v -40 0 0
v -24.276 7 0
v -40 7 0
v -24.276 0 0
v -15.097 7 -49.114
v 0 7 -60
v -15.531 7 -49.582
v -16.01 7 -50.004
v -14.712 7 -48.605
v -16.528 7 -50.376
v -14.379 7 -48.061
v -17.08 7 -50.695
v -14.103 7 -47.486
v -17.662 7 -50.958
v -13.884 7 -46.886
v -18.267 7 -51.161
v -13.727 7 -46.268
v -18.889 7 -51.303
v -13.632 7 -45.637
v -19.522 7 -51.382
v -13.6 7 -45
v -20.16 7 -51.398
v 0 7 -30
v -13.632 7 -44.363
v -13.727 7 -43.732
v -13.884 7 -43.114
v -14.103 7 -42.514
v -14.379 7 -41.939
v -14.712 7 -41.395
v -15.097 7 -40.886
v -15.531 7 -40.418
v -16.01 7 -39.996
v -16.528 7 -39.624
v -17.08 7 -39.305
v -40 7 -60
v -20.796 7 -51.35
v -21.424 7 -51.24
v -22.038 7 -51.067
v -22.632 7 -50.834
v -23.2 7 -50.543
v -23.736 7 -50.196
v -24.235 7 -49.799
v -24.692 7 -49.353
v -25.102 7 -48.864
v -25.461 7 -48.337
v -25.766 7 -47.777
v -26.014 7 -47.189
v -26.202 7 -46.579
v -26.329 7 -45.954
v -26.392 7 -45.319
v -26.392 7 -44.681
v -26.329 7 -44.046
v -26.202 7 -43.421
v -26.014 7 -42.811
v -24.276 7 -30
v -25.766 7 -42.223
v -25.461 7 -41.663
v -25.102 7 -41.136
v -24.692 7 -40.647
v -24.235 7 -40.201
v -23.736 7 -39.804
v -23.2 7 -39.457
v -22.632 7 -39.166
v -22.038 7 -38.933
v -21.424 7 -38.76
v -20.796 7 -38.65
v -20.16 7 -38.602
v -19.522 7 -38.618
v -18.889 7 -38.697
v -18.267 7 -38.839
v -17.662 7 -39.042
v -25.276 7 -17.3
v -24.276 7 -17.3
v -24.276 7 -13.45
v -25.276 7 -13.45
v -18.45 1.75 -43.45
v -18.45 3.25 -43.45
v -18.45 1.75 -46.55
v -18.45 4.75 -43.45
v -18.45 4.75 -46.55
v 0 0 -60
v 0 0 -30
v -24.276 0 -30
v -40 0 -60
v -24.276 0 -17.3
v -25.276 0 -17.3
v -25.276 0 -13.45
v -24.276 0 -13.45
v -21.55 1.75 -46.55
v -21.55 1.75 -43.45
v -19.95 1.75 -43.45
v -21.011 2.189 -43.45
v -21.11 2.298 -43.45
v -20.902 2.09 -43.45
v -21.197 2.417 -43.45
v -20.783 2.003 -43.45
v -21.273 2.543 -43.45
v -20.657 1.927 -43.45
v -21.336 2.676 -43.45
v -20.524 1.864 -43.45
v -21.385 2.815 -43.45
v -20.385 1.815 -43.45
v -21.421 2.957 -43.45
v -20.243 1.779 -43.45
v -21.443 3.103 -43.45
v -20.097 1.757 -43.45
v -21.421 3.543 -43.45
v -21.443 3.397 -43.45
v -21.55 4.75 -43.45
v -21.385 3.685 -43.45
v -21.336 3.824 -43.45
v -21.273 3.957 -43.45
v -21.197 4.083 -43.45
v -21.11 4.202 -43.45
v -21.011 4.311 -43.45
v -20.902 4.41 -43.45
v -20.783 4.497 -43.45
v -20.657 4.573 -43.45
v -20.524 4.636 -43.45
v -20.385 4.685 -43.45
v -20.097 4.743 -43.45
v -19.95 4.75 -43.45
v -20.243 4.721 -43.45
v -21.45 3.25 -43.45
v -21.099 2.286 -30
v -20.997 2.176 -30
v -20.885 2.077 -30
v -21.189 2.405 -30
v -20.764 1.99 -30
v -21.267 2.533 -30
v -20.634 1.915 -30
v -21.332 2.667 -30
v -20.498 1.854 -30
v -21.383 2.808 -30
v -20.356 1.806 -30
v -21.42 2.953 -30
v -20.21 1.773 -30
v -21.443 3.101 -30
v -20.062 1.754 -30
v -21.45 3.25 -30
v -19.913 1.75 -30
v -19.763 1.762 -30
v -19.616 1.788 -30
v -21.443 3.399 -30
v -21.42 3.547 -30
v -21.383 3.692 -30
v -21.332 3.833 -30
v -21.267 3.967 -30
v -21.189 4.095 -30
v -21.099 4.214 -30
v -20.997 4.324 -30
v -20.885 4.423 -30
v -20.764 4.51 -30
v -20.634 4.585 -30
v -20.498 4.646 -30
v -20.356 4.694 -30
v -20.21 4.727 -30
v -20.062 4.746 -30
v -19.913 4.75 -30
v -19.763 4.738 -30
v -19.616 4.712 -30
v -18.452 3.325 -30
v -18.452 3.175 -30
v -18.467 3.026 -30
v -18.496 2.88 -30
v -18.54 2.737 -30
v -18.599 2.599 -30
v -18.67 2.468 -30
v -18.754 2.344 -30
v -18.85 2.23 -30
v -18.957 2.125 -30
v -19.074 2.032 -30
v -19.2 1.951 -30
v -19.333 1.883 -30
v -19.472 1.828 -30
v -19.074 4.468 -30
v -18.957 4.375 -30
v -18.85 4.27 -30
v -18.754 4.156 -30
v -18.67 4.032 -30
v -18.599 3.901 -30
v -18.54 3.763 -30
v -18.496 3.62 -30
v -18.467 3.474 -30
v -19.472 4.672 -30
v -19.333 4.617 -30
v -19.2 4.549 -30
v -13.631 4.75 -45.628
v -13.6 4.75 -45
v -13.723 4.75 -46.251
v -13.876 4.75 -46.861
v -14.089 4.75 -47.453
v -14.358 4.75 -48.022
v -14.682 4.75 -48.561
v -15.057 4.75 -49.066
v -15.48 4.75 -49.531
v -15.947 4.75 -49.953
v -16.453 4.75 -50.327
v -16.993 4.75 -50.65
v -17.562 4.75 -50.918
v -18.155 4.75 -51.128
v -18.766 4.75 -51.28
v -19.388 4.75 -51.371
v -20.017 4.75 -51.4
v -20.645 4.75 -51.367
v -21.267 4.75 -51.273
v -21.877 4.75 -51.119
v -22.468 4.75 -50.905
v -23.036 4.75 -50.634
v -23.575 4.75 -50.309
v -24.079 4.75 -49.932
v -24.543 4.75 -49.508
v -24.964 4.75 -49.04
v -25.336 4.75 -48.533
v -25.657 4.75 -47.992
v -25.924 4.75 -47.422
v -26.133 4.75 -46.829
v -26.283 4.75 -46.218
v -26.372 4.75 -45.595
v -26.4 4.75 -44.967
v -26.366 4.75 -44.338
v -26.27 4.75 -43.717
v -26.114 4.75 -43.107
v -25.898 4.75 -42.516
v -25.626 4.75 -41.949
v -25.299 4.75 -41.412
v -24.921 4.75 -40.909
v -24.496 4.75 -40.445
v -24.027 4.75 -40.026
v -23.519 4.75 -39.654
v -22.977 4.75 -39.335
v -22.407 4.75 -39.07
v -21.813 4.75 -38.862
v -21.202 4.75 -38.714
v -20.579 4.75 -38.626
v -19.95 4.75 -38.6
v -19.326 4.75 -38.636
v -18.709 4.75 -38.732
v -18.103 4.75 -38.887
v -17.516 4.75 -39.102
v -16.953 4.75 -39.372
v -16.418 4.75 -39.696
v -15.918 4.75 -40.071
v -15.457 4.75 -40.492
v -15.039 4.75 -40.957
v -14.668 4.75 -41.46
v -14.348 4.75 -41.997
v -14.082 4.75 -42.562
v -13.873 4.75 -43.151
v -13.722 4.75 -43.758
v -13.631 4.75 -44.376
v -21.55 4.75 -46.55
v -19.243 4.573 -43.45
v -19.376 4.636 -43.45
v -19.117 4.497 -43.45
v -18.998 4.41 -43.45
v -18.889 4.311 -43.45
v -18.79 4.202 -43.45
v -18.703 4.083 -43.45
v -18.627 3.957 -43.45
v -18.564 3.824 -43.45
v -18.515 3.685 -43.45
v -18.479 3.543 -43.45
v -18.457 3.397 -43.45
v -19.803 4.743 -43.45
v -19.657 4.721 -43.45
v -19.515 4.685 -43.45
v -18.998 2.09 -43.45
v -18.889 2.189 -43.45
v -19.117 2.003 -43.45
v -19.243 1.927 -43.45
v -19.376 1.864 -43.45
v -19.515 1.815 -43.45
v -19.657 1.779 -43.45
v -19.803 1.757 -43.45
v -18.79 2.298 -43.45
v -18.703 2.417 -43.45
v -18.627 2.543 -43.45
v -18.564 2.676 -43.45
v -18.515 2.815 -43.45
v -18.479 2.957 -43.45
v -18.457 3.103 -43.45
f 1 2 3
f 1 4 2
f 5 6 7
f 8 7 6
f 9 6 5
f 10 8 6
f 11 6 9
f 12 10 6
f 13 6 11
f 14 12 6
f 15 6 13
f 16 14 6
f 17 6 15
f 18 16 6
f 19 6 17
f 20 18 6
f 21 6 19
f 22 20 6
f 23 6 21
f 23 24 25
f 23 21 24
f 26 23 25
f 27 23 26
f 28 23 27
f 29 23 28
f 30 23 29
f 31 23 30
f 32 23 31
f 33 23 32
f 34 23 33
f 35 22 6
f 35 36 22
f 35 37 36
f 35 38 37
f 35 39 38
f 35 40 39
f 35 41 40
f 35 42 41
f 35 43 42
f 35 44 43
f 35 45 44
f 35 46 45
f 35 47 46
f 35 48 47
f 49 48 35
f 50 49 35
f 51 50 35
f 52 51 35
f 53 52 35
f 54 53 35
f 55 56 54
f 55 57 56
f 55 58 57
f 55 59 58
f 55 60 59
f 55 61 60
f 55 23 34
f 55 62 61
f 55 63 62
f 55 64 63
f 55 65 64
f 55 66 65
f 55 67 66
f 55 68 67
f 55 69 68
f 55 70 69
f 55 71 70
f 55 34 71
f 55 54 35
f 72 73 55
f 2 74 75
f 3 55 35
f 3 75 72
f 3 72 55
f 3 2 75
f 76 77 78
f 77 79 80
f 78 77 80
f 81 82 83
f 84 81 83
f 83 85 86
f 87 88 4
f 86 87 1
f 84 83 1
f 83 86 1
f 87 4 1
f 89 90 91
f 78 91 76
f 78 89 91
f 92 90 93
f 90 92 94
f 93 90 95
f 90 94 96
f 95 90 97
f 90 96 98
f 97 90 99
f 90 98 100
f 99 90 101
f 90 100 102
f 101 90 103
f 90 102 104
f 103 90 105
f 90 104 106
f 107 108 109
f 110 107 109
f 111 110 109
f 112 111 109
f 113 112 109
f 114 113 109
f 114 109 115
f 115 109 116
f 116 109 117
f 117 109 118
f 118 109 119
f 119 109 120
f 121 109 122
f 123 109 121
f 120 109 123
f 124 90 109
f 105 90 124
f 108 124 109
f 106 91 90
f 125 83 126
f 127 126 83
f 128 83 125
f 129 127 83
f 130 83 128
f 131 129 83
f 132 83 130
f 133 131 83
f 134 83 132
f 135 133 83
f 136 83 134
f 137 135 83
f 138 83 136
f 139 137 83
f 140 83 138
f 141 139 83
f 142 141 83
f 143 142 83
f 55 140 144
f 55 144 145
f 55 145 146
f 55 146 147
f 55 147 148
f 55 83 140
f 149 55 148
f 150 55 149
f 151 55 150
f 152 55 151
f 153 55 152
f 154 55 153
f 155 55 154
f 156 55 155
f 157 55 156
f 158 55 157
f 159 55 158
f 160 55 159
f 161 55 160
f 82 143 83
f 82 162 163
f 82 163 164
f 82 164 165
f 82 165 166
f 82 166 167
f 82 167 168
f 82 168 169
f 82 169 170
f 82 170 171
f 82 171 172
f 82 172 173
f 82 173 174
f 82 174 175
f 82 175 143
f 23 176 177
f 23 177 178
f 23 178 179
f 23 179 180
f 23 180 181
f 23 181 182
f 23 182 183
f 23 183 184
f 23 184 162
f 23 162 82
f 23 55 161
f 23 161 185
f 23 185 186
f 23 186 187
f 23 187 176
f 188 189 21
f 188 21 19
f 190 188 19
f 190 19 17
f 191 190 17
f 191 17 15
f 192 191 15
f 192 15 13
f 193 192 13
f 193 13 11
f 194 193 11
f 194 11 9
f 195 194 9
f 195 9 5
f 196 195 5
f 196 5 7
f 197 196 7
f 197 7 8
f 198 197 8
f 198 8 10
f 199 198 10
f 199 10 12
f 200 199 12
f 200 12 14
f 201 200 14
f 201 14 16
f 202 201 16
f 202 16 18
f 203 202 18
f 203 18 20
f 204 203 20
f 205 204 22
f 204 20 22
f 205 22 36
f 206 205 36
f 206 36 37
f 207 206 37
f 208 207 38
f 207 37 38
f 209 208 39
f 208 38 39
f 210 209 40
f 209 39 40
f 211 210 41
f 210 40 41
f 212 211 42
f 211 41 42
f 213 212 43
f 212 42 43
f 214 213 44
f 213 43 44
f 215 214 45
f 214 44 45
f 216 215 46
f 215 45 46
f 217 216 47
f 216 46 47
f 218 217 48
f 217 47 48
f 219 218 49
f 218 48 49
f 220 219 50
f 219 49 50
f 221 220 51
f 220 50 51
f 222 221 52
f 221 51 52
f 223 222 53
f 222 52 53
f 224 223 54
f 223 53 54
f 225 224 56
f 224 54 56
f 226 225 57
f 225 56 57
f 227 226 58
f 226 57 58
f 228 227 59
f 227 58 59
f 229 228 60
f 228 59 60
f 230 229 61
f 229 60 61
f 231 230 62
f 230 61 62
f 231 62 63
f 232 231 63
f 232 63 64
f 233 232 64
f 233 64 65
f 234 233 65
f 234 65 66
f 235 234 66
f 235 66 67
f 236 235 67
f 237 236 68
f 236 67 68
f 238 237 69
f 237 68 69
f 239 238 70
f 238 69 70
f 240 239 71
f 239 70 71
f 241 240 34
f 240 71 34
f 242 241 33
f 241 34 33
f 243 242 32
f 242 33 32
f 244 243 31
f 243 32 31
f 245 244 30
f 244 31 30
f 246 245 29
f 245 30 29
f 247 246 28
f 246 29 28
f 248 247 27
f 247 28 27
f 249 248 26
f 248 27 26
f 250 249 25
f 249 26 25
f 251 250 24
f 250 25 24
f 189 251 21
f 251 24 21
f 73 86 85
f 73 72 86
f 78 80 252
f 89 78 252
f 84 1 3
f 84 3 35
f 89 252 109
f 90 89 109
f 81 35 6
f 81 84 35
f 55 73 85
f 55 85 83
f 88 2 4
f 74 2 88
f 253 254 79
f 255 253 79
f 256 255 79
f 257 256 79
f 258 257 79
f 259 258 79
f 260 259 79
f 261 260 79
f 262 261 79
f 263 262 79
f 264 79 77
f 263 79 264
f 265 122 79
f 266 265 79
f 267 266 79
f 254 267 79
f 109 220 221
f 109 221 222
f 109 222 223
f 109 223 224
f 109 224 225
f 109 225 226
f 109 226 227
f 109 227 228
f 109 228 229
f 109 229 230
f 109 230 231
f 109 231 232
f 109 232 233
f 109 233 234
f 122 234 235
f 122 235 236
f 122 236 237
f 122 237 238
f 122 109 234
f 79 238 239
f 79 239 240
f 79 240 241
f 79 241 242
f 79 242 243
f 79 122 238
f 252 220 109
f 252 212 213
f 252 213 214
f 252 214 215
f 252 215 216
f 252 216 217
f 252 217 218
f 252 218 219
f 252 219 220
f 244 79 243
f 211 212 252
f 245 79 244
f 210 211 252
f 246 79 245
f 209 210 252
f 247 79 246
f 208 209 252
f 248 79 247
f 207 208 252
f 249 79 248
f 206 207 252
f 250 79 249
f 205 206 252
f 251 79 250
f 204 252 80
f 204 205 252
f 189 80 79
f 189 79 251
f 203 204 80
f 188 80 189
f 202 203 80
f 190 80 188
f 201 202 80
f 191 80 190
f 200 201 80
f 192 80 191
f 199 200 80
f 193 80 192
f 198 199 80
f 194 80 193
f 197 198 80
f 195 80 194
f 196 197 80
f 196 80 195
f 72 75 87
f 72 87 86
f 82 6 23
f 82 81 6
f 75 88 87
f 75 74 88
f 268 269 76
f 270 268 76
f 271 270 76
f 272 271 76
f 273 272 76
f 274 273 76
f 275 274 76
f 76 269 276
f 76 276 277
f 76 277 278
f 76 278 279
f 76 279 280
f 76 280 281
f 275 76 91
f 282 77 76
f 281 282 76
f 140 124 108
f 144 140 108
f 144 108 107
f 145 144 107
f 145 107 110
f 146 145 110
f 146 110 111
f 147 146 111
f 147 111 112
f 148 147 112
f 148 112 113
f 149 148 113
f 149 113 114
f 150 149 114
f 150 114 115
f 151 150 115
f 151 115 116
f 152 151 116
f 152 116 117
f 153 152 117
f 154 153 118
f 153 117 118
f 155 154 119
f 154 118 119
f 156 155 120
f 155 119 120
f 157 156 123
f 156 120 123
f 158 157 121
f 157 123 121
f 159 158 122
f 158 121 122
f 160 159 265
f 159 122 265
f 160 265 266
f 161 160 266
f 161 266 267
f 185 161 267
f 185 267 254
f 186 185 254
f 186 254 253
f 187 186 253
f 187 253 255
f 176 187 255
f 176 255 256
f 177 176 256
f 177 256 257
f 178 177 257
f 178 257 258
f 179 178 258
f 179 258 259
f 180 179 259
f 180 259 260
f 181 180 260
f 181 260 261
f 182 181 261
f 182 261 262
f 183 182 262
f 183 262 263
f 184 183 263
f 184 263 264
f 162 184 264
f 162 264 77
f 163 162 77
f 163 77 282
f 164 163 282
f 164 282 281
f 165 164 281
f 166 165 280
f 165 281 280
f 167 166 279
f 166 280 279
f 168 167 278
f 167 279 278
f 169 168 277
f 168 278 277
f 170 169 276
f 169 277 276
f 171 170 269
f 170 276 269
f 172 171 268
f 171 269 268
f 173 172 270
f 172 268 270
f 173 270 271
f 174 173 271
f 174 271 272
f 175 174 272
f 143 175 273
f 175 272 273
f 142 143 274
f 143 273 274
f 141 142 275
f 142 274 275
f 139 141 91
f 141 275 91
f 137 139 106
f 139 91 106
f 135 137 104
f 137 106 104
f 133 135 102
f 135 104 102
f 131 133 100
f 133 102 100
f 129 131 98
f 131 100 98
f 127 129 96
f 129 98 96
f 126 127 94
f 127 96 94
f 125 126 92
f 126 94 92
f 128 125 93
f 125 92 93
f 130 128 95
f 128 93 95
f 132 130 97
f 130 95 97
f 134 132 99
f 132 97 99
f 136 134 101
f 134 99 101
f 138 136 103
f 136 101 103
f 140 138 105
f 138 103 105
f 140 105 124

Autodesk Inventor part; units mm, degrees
ref_plane "YZ Plane" through (0, 0, 0) normal (1, 0, 0) x (0, 1, 0)
ref_plane "XZ Plane" through (0, 0, 0) normal (0, 1, 0) x (-1, 0, 0)
ref_plane "XY Plane" through (0, 0, 0) normal (0, 0, 1) x (1, 0, 0)
sketch "Sketch1" plane through (0, 0, 0) normal (0, 1, 0) x (-1, 0, 0)
  line L0 (0, 0) -> (40, 0)
  line L1 (40, 0) -> (40, -60)
  line L2 (40, -60) -> (0, -60)
  line L3 (0, -60) -> (0, 0)
  dimension "d0" = 40
  dimension "d1" = 60
extrude "Extrusion1" add sketch "Sketch1" along normal blind 7
sketch "Sketch2" plane through (0, 7, 0) normal (0, 1, 0) x (1, 0, 0)
  line L0 (-40, 0) -> (0, 0) projected
  line L1 (0, 0) -> (-24.276, 0)
  line L2 (-24.276, 0) -> (-24.276, 30)
  line L3 (-24.276, 30) -> (0, 30)
  line L4 (0, 30) -> (0, 0)
  dimension "d4" = 24.276
  dimension "d5" = 30
extrude "Extrusion2" cut sketch "Sketch2" against normal through all
sketch "Sketch3" plane through (0, 7, 0) normal (0, 1, 0) x (1, 0, 0)
  circle A0 centre (-20, 45) radius 6.4
  point P0 (0, 0)
  dimension "d8" = 12.8
extrude "Extrusion3" cut sketch "Sketch3" against normal blind 2.25
sketch "Sketch4" plane through (-20, 4.75, -45) normal (0, 1, 0) x (1, 0, 0)
  line L0 (-1.55, -1.55) -> (1.55, -1.55)
  line L1 (1.55, -1.55) -> (1.55, 1.55)
  line L2 (1.55, 1.55) -> (-1.55, 1.55)
  line L3 (-1.55, 1.55) -> (-1.55, -1.55)
  line L4 (-1.55, -1.55) -> (1.55, 1.55) construction
  line L5 (1.55, -1.55) -> (-1.55, 1.55) construction
  point P0 (20, -45)
  point P1 (0, 0)
  dimension "d11" = 3.1
  dimension "d12" = 3.1
extrude "Extrusion4" cut sketch "Sketch4" against normal blind 3
sketch "Sketch6" plane through (-18.45, 4.75, -43.45) normal (0, 0, -1) x (-1, 0, 0)
  circle A0 centre (1.5, -1.5) radius 1.5
  point P0 (-18.45, -4.75)
  dimension "d18" = 3
extrude "Extrusion6" cut sketch "Sketch6" against normal through all
sketch "Sketch7" plane through (0, 7, 0) normal (0, 1, 0) x (1, 0, 0)
  line L0 (-25.276, 17.3) -> (-21.276, 17.3)
  line L1 (-21.276, 17.3) -> (-21.276, 13.45)
  line L2 (-21.276, 13.45) -> (-25.276, 13.45)
  line L3 (-25.276, 13.45) -> (-25.276, 17.3)
  line L4 (-24.276, 0) -> (-24.276, 30) projected
  line L5 (-24.276, 30) -> (0, 30) projected
  point P0 (0, 0)
  dimension "d21" = 3.85
  dimension "d22" = 1
  dimension "d23" = 4
  dimension "d24" = 12.7
extrude "Extrusion7" cut sketch "Sketch7" against normal through all
properties part number "torch_light_injection_3d_pirnt_v0-1_20feb25" material "ABS Plastic"
